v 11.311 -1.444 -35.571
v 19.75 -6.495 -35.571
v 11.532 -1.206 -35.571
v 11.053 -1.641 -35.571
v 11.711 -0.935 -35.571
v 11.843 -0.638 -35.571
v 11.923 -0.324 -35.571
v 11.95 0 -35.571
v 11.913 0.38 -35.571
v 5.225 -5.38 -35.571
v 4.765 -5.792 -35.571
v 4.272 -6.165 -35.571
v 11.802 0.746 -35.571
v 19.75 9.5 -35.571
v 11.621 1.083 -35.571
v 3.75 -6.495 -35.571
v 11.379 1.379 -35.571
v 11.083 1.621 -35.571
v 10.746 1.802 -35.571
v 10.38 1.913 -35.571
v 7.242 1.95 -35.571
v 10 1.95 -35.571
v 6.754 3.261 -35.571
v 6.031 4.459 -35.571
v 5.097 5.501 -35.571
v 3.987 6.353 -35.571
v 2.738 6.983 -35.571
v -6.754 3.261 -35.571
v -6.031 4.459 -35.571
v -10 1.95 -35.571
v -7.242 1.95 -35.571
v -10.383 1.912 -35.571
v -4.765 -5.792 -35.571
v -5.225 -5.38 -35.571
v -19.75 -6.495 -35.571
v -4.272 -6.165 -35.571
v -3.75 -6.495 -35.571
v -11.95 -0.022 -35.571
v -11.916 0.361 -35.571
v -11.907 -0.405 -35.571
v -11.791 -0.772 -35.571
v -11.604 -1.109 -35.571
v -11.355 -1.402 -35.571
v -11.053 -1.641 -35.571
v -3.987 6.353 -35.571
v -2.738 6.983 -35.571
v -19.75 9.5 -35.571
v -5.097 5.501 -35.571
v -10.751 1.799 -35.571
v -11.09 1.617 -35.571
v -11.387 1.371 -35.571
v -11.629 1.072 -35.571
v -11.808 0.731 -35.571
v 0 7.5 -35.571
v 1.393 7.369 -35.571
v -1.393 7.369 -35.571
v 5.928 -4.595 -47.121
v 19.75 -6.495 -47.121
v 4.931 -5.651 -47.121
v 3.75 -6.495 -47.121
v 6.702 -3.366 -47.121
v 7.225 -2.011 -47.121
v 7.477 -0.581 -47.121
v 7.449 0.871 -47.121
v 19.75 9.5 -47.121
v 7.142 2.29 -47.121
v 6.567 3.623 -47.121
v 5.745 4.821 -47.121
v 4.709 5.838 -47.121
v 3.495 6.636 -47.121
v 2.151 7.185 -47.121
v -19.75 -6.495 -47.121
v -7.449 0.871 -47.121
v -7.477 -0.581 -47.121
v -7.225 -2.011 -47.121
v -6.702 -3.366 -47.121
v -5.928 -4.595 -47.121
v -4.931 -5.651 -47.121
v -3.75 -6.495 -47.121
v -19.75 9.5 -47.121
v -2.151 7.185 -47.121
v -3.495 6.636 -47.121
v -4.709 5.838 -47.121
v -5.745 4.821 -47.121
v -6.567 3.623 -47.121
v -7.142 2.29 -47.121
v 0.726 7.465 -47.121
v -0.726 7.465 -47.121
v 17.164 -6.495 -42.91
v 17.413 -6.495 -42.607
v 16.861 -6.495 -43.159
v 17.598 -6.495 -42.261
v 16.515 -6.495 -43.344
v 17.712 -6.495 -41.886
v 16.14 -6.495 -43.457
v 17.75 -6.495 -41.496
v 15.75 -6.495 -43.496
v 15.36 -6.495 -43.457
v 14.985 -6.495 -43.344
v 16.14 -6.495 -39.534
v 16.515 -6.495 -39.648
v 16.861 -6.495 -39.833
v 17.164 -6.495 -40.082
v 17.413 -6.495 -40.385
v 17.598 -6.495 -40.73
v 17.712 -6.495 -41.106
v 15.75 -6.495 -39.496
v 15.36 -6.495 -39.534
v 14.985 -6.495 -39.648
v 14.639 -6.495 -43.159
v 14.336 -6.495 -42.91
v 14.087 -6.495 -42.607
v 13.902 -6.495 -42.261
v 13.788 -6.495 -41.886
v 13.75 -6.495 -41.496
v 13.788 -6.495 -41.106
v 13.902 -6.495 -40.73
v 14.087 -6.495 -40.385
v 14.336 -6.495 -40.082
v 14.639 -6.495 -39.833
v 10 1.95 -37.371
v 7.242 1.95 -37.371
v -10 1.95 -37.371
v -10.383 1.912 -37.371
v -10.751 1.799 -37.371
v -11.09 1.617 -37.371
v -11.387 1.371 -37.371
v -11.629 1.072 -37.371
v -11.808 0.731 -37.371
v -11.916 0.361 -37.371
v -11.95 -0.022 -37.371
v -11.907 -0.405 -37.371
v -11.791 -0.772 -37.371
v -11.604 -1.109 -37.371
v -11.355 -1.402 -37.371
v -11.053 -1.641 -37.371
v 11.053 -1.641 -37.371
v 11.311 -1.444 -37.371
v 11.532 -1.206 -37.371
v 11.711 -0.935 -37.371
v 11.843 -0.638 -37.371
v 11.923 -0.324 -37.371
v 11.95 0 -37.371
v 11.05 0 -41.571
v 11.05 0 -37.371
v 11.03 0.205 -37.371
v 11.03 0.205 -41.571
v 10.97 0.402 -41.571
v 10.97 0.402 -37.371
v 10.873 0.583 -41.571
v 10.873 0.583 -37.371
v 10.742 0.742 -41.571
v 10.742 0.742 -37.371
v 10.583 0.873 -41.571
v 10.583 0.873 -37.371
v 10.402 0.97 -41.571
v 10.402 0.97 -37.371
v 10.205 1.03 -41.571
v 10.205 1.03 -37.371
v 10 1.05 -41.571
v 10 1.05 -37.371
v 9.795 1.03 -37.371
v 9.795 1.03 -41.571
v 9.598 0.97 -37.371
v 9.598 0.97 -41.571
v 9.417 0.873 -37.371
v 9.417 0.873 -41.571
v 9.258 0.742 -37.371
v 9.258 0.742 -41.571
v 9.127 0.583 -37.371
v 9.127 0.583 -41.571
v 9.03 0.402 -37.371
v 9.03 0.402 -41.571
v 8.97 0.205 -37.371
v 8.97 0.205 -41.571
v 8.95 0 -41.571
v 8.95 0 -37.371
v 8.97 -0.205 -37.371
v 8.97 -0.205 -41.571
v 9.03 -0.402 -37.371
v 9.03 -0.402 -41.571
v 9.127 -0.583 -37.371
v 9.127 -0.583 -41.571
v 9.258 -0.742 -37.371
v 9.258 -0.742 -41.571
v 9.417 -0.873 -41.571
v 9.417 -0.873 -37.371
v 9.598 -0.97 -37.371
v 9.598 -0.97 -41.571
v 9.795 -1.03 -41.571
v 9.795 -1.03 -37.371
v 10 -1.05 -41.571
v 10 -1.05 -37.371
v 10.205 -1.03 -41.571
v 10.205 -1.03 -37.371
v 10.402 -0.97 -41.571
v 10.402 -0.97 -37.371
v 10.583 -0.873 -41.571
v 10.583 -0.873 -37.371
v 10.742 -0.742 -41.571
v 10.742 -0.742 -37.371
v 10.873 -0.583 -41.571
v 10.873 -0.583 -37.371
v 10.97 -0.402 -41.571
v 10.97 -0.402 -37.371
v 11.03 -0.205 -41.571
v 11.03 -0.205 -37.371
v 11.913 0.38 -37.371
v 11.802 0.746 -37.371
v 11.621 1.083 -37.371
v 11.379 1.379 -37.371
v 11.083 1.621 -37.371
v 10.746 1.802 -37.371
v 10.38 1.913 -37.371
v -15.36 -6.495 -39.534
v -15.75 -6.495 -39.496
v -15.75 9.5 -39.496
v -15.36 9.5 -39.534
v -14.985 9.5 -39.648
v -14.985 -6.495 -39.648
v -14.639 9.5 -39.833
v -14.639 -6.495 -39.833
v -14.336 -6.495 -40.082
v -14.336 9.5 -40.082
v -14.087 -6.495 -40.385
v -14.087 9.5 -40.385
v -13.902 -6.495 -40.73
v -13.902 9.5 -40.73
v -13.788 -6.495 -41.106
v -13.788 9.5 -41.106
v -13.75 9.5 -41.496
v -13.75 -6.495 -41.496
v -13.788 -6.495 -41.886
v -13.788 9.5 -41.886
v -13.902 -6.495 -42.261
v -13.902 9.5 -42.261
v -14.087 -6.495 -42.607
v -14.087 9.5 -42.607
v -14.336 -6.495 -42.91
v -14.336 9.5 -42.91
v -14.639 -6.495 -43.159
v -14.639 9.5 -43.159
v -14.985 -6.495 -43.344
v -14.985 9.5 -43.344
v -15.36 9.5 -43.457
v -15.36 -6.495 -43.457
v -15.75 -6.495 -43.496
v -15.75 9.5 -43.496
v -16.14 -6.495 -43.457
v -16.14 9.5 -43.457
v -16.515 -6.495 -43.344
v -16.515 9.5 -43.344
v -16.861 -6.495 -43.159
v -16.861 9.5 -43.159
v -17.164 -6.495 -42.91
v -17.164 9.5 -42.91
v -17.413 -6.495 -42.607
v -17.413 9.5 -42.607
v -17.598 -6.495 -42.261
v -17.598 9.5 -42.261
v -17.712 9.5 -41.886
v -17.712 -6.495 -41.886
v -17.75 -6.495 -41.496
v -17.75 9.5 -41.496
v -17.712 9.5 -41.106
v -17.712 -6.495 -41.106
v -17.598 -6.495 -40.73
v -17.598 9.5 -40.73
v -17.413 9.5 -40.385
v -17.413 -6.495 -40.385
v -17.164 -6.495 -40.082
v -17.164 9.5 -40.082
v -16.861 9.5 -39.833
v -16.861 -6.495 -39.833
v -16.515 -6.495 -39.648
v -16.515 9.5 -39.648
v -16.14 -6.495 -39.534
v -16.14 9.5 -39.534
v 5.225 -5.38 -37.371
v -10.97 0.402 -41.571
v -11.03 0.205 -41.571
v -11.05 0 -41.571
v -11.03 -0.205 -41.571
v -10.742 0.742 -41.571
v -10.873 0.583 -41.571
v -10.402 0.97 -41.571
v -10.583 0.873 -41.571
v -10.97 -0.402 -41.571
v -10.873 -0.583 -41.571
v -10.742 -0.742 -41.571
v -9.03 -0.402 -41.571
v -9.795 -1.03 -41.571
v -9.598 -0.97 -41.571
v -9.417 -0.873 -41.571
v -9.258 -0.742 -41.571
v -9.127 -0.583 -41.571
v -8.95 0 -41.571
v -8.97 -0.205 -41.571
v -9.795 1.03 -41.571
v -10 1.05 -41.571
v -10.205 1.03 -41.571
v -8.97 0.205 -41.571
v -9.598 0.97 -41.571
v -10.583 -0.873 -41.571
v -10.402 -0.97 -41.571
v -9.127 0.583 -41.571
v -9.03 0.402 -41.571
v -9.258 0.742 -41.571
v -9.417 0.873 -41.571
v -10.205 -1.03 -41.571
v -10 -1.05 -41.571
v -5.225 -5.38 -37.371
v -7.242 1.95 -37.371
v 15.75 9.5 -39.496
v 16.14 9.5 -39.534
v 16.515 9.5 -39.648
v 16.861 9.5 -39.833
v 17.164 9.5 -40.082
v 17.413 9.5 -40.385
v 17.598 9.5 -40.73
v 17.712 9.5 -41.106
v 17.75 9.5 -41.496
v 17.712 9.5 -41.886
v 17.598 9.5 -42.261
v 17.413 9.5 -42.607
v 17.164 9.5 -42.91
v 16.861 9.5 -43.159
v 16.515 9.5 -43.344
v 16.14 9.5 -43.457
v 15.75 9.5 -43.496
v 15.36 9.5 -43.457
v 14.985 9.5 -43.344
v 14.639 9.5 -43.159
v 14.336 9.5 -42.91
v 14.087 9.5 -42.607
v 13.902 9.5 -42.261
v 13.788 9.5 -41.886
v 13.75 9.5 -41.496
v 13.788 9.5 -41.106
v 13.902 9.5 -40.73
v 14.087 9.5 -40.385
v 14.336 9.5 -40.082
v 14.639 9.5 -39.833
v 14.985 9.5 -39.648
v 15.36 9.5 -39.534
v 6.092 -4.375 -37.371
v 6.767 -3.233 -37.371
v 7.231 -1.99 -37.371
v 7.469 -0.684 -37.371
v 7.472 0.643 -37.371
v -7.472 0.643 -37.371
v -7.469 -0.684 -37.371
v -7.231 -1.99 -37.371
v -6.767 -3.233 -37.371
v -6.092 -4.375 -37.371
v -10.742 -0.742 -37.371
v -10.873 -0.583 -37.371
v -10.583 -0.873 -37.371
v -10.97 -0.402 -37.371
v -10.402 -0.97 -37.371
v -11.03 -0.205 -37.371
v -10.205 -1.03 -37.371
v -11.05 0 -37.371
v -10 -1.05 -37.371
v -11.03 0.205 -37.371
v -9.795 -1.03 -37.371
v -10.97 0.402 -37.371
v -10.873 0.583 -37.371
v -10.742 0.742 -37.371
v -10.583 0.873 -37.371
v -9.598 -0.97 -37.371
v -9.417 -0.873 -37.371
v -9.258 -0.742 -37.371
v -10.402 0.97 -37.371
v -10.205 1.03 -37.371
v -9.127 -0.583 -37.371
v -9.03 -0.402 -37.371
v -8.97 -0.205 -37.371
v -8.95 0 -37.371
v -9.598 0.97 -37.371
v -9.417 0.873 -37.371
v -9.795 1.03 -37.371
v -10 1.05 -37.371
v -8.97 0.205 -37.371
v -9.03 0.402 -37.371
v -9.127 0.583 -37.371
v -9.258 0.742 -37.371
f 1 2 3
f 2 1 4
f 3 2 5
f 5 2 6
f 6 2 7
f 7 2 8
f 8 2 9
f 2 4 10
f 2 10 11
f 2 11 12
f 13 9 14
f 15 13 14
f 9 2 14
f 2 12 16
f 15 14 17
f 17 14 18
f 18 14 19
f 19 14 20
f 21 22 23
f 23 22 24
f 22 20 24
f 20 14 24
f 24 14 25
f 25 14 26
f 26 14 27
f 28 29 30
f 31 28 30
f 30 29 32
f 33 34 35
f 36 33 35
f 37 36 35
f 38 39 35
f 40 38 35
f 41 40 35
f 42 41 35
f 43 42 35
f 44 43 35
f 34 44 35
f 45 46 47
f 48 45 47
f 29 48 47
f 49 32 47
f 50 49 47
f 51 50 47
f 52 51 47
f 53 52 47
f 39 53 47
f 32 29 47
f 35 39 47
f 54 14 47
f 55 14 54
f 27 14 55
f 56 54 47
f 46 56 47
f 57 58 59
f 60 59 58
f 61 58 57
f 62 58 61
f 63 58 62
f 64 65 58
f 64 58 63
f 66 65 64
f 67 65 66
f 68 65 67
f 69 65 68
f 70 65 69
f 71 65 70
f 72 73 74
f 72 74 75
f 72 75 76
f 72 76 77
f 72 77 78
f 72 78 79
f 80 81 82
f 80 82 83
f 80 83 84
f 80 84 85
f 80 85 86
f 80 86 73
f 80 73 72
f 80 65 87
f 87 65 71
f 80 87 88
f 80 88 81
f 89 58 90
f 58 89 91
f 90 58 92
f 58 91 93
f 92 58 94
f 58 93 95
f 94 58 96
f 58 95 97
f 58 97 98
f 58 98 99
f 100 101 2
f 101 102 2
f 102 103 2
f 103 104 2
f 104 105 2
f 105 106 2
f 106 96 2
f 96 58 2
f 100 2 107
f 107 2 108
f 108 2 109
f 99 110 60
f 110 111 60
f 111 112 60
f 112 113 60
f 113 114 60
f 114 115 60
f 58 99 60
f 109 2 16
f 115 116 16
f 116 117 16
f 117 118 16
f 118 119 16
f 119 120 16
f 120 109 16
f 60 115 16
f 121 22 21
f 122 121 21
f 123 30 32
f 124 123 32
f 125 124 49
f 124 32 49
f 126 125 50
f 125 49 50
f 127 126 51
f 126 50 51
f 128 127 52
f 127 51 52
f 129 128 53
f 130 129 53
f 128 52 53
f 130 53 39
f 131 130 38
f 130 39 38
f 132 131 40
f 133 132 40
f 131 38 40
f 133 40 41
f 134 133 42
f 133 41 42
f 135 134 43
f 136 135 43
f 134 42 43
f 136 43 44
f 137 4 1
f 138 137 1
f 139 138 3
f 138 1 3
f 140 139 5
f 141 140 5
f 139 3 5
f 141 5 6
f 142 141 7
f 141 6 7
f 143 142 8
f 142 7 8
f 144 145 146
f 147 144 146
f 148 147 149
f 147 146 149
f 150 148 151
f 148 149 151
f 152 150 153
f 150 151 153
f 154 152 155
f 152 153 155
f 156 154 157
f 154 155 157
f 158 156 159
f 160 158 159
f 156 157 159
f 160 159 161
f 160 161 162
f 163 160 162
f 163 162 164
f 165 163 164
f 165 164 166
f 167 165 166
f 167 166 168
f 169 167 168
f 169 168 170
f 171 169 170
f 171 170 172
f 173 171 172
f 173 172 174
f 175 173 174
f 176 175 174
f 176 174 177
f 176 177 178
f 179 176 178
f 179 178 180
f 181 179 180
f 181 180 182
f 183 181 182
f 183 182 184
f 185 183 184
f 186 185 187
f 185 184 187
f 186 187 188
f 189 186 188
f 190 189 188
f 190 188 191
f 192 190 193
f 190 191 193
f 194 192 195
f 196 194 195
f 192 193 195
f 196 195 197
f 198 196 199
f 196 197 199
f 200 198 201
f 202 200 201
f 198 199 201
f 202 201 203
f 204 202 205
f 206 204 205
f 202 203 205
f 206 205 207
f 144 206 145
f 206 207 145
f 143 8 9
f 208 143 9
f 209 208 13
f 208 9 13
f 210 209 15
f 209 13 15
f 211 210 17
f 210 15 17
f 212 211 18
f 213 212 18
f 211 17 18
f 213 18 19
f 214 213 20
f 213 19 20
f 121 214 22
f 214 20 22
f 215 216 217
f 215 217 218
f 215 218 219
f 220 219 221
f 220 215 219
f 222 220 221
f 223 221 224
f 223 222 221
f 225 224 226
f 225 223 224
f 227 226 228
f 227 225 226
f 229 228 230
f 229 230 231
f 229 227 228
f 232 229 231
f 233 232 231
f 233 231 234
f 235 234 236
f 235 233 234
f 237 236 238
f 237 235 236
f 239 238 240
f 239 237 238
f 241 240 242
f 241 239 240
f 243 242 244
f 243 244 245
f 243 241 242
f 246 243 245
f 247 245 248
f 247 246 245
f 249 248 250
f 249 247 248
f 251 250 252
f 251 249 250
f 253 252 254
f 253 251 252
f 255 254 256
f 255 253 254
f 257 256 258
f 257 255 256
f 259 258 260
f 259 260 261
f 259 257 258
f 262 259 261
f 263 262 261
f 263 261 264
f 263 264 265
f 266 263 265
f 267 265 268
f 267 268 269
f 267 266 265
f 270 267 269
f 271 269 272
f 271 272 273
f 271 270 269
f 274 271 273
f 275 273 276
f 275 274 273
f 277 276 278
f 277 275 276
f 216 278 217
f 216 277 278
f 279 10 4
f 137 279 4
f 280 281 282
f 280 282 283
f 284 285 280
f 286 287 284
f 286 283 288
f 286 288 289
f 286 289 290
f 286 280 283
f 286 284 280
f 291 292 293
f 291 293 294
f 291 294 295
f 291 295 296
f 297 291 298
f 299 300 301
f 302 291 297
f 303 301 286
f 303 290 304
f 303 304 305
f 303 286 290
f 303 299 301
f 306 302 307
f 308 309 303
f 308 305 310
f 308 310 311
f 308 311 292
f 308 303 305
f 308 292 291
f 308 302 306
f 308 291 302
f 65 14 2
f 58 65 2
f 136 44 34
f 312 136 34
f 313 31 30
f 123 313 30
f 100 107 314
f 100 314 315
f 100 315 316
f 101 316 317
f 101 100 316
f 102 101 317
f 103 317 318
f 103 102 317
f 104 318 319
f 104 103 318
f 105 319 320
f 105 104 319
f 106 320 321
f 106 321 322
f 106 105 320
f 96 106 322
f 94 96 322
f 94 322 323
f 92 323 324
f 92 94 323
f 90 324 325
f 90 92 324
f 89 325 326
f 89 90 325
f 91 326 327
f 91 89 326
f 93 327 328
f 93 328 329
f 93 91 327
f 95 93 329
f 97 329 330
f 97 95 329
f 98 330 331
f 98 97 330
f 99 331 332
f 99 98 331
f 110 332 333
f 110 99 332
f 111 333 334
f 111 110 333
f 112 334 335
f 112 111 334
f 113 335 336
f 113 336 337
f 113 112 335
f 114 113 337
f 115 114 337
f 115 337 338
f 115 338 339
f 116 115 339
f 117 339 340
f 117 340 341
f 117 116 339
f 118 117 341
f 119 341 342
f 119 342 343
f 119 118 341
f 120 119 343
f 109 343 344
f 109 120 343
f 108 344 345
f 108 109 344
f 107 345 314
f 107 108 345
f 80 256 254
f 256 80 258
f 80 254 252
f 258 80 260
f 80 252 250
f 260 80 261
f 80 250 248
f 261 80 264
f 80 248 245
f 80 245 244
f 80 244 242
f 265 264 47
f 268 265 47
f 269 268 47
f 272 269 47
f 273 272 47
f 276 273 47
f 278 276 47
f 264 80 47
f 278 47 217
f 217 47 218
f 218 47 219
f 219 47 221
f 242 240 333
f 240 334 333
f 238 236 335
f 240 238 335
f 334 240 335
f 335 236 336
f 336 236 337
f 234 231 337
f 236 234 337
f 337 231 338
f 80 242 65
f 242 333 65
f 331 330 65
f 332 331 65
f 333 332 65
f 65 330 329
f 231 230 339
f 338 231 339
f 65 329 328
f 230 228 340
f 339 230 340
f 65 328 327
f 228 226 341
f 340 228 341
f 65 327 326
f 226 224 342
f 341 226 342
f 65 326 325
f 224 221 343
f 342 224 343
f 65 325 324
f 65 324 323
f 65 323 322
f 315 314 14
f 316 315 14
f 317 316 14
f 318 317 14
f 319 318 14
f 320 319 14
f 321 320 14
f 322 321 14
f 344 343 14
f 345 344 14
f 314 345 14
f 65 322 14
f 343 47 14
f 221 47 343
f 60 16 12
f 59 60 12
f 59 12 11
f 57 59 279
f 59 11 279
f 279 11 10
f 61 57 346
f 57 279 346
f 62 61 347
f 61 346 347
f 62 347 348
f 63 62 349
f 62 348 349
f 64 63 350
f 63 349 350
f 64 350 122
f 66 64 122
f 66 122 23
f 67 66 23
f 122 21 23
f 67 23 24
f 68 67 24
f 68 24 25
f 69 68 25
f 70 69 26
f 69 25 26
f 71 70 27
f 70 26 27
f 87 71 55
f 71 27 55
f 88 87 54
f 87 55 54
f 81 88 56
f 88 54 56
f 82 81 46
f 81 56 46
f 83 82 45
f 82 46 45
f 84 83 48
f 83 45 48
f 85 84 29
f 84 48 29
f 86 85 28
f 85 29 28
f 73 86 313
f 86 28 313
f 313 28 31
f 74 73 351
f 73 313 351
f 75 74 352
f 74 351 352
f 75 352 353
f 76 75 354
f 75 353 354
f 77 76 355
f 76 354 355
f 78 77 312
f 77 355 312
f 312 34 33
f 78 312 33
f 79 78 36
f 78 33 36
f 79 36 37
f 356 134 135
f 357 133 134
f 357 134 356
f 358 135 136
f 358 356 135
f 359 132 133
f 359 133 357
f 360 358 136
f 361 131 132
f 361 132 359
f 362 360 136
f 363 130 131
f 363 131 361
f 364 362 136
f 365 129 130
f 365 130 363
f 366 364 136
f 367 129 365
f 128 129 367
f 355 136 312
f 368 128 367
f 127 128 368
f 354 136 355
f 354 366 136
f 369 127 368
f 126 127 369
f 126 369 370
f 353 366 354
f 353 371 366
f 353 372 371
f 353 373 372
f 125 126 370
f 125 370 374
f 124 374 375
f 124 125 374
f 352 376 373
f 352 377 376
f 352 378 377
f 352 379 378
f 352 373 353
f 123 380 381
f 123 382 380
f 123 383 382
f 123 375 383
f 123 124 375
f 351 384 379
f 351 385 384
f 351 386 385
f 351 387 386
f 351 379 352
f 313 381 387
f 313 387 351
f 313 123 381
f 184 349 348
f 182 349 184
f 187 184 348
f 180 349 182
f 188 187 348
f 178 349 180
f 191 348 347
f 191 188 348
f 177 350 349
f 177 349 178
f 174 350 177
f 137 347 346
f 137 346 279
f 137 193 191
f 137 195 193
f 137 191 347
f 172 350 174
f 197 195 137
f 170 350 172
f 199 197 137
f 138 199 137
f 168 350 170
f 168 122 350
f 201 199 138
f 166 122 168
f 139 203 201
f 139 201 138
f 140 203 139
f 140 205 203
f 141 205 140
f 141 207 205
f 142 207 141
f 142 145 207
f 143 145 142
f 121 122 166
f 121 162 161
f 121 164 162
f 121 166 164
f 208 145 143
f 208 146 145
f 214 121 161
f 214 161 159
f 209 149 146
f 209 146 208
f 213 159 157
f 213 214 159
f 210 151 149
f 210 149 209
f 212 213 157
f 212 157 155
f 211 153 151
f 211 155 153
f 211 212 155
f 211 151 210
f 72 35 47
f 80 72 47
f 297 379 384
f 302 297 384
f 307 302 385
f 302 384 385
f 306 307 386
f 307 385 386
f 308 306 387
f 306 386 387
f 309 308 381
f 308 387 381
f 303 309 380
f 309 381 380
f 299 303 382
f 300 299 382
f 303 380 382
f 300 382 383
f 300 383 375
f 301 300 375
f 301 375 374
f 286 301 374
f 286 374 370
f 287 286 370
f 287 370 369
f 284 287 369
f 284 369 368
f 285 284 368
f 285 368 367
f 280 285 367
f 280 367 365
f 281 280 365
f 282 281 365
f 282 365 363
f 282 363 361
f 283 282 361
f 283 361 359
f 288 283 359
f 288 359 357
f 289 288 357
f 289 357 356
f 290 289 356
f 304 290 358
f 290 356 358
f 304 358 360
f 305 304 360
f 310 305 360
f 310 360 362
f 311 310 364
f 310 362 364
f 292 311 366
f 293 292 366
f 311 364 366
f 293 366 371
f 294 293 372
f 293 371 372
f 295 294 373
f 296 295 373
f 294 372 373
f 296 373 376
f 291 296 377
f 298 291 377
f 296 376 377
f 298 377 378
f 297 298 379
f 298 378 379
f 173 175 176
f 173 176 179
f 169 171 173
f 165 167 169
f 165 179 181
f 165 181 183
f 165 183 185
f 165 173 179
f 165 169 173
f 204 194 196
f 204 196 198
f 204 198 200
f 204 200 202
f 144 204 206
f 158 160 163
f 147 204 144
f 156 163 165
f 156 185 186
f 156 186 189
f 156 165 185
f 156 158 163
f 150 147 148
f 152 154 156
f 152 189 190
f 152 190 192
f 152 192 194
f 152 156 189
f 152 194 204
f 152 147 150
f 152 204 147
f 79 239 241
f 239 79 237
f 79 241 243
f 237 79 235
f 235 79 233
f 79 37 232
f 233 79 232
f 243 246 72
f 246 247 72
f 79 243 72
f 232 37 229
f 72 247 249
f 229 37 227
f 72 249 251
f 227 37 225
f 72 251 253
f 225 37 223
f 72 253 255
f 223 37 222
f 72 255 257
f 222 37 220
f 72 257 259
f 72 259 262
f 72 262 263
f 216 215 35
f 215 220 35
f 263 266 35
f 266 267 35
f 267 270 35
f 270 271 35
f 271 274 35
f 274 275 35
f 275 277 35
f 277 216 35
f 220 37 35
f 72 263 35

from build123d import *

# Parameters (mm, degrees)
BODY_EXTRUDE_DEPTH                       = 11.55
BODY_4_R                                 = 1.05
WINGS_CUT_EXTRUDE_DEPTH                  = 1.8
BODY_5_R                                 = 1.05
SCREW_HOLES_CUT_EXTRUDE_DEPTH            = 6
ADJUSTMENT_START                         = -15.995191
ADJUSTMENT_SCREW_HOLES_R                 = 2
ADJUSTMENT_SCREW_HOLES_CUT_EXTRUDE_DEPTH = 15.995191


with BuildPart() as part:
    # BODY → Body Extrude (new body)
    with BuildSketch(Plane.XY.offset(-35.57079385)):
        with BuildLine():
            Line((-3.75, -6.495190528), (-19.75, -6.495190528))
            Line((-19.75, -6.495190528), (-19.75, 9.5))
            Line((-19.75, 9.5), (19.75, 9.5))
            Line((19.75, 9.5), (19.75, -6.495190528))
            Line((19.75, -6.495190528), (3.75, -6.495190528))
            ThreePointArc((3.75, -6.495190528), (0, 7.5), (-3.75, -6.495190528))
        make_face()
    extrude(amount=-BODY_EXTRUDE_DEPTH)

    # BODY<4> → Wings Cut Extrude (cut)
    # profile 1 of 4: a face of its own
    with BuildSketch(Plane.XY.offset(-35.57079385)):
        with BuildLine():
            Line((10, 1.95), (7.242064623, 1.95))
            ThreePointArc((7.242064623, 1.95), (7.231272158, -1.98964896), (5.225169177, -5.380298047))
            Line((5.225169177, -5.380298047), (11.053, -1.641246782))
            ThreePointArc((11.053, -1.641246782), (11.711118056, -0.935187147), (11.95, 0))
            ThreePointArc((11.95, 0), (11.378858223, 1.378858223), (10, 1.95))
        make_face()
        with BuildLine():
            ThreePointArc((8.8, 0), (10, 1.2), (11.2, 0))
            ThreePointArc((11.2, 0), (10, -1.2), (8.8, 0))
        make_face(mode=Mode.SUBTRACT)
    # profile 2 of 4: a face of its own
    with BuildSketch(Plane.XY.offset(-35.57079385)):
        with BuildLine():
            ThreePointArc((11.2, 0), (10, -1.2), (8.8, 0))
            ThreePointArc((8.8, 0), (10, 1.2), (11.2, 0))
        make_face()
        with Locations((10, 0)):
            Circle(BODY_4_R, mode=Mode.SUBTRACT)
    # profile 3 of 4: a face of its own
    with BuildSketch(Plane.XY.offset(-35.57079385)):
        with BuildLine():
            Line((-11.053, -1.641246782), (-5.225169177, -5.380298047))
            ThreePointArc((-5.225169177, -5.380298047), (-7.231272158, -1.98964896), (-7.242064623, 1.95))
            Line((-7.242064623, 1.95), (-10, 1.95))
            ThreePointArc((-10, 1.95), (-11.871220354, 0.548666007), (-11.053, -1.641246782))
        make_face()
        with BuildLine():
            ThreePointArc((-11.2, 0), (-10, 1.2), (-8.8, 0))
            ThreePointArc((-8.8, 0), (-10, -1.2), (-11.2, 0))
        make_face(mode=Mode.SUBTRACT)
    # profile 4 of 4: a face of its own
    with BuildSketch(Plane.XY.offset(-35.57079385)):
        with BuildLine():
            ThreePointArc((-8.8, 0), (-10, -1.2), (-11.2, 0))
            ThreePointArc((-11.2, 0), (-10, 1.2), (-8.8, 0))
        make_face()
        with Locations((-10, 0)):
            Circle(BODY_4_R, mode=Mode.SUBTRACT)
    extrude(amount=-WINGS_CUT_EXTRUDE_DEPTH, mode=Mode.SUBTRACT)

    # BODY<5> → Screw Holes Cut Extrude (cut)
    with BuildSketch(Plane.XY.offset(-35.57079385)):
        with Locations((-10, 0)):
            Circle(BODY_5_R)
        with Locations((10, 0)):
            Circle(BODY_5_R)
    extrude(amount=-SCREW_HOLES_CUT_EXTRUDE_DEPTH, mode=Mode.SUBTRACT)

    # ADJUSTMENT SCREW HOLES → Adjustment Screw Holes Cut Extrude (cut)
    with BuildSketch(Plane(origin=(0, 9.5, 0), x_dir=(1, 0, 0), z_dir=(0, 1, 0)).offset(ADJUSTMENT_START)):
        with Locations(Location((-15.75, 41.49579385, 0), (0, 0, 270))):
            Circle(ADJUSTMENT_SCREW_HOLES_R)
        with Locations(Location((15.75, 41.49579385, 0), (0, 0, 270))):
            Circle(ADJUSTMENT_SCREW_HOLES_R)
    extrude(amount=ADJUSTMENT_SCREW_HOLES_CUT_EXTRUDE_DEPTH, mode=Mode.SUBTRACT)


solid = part.part
